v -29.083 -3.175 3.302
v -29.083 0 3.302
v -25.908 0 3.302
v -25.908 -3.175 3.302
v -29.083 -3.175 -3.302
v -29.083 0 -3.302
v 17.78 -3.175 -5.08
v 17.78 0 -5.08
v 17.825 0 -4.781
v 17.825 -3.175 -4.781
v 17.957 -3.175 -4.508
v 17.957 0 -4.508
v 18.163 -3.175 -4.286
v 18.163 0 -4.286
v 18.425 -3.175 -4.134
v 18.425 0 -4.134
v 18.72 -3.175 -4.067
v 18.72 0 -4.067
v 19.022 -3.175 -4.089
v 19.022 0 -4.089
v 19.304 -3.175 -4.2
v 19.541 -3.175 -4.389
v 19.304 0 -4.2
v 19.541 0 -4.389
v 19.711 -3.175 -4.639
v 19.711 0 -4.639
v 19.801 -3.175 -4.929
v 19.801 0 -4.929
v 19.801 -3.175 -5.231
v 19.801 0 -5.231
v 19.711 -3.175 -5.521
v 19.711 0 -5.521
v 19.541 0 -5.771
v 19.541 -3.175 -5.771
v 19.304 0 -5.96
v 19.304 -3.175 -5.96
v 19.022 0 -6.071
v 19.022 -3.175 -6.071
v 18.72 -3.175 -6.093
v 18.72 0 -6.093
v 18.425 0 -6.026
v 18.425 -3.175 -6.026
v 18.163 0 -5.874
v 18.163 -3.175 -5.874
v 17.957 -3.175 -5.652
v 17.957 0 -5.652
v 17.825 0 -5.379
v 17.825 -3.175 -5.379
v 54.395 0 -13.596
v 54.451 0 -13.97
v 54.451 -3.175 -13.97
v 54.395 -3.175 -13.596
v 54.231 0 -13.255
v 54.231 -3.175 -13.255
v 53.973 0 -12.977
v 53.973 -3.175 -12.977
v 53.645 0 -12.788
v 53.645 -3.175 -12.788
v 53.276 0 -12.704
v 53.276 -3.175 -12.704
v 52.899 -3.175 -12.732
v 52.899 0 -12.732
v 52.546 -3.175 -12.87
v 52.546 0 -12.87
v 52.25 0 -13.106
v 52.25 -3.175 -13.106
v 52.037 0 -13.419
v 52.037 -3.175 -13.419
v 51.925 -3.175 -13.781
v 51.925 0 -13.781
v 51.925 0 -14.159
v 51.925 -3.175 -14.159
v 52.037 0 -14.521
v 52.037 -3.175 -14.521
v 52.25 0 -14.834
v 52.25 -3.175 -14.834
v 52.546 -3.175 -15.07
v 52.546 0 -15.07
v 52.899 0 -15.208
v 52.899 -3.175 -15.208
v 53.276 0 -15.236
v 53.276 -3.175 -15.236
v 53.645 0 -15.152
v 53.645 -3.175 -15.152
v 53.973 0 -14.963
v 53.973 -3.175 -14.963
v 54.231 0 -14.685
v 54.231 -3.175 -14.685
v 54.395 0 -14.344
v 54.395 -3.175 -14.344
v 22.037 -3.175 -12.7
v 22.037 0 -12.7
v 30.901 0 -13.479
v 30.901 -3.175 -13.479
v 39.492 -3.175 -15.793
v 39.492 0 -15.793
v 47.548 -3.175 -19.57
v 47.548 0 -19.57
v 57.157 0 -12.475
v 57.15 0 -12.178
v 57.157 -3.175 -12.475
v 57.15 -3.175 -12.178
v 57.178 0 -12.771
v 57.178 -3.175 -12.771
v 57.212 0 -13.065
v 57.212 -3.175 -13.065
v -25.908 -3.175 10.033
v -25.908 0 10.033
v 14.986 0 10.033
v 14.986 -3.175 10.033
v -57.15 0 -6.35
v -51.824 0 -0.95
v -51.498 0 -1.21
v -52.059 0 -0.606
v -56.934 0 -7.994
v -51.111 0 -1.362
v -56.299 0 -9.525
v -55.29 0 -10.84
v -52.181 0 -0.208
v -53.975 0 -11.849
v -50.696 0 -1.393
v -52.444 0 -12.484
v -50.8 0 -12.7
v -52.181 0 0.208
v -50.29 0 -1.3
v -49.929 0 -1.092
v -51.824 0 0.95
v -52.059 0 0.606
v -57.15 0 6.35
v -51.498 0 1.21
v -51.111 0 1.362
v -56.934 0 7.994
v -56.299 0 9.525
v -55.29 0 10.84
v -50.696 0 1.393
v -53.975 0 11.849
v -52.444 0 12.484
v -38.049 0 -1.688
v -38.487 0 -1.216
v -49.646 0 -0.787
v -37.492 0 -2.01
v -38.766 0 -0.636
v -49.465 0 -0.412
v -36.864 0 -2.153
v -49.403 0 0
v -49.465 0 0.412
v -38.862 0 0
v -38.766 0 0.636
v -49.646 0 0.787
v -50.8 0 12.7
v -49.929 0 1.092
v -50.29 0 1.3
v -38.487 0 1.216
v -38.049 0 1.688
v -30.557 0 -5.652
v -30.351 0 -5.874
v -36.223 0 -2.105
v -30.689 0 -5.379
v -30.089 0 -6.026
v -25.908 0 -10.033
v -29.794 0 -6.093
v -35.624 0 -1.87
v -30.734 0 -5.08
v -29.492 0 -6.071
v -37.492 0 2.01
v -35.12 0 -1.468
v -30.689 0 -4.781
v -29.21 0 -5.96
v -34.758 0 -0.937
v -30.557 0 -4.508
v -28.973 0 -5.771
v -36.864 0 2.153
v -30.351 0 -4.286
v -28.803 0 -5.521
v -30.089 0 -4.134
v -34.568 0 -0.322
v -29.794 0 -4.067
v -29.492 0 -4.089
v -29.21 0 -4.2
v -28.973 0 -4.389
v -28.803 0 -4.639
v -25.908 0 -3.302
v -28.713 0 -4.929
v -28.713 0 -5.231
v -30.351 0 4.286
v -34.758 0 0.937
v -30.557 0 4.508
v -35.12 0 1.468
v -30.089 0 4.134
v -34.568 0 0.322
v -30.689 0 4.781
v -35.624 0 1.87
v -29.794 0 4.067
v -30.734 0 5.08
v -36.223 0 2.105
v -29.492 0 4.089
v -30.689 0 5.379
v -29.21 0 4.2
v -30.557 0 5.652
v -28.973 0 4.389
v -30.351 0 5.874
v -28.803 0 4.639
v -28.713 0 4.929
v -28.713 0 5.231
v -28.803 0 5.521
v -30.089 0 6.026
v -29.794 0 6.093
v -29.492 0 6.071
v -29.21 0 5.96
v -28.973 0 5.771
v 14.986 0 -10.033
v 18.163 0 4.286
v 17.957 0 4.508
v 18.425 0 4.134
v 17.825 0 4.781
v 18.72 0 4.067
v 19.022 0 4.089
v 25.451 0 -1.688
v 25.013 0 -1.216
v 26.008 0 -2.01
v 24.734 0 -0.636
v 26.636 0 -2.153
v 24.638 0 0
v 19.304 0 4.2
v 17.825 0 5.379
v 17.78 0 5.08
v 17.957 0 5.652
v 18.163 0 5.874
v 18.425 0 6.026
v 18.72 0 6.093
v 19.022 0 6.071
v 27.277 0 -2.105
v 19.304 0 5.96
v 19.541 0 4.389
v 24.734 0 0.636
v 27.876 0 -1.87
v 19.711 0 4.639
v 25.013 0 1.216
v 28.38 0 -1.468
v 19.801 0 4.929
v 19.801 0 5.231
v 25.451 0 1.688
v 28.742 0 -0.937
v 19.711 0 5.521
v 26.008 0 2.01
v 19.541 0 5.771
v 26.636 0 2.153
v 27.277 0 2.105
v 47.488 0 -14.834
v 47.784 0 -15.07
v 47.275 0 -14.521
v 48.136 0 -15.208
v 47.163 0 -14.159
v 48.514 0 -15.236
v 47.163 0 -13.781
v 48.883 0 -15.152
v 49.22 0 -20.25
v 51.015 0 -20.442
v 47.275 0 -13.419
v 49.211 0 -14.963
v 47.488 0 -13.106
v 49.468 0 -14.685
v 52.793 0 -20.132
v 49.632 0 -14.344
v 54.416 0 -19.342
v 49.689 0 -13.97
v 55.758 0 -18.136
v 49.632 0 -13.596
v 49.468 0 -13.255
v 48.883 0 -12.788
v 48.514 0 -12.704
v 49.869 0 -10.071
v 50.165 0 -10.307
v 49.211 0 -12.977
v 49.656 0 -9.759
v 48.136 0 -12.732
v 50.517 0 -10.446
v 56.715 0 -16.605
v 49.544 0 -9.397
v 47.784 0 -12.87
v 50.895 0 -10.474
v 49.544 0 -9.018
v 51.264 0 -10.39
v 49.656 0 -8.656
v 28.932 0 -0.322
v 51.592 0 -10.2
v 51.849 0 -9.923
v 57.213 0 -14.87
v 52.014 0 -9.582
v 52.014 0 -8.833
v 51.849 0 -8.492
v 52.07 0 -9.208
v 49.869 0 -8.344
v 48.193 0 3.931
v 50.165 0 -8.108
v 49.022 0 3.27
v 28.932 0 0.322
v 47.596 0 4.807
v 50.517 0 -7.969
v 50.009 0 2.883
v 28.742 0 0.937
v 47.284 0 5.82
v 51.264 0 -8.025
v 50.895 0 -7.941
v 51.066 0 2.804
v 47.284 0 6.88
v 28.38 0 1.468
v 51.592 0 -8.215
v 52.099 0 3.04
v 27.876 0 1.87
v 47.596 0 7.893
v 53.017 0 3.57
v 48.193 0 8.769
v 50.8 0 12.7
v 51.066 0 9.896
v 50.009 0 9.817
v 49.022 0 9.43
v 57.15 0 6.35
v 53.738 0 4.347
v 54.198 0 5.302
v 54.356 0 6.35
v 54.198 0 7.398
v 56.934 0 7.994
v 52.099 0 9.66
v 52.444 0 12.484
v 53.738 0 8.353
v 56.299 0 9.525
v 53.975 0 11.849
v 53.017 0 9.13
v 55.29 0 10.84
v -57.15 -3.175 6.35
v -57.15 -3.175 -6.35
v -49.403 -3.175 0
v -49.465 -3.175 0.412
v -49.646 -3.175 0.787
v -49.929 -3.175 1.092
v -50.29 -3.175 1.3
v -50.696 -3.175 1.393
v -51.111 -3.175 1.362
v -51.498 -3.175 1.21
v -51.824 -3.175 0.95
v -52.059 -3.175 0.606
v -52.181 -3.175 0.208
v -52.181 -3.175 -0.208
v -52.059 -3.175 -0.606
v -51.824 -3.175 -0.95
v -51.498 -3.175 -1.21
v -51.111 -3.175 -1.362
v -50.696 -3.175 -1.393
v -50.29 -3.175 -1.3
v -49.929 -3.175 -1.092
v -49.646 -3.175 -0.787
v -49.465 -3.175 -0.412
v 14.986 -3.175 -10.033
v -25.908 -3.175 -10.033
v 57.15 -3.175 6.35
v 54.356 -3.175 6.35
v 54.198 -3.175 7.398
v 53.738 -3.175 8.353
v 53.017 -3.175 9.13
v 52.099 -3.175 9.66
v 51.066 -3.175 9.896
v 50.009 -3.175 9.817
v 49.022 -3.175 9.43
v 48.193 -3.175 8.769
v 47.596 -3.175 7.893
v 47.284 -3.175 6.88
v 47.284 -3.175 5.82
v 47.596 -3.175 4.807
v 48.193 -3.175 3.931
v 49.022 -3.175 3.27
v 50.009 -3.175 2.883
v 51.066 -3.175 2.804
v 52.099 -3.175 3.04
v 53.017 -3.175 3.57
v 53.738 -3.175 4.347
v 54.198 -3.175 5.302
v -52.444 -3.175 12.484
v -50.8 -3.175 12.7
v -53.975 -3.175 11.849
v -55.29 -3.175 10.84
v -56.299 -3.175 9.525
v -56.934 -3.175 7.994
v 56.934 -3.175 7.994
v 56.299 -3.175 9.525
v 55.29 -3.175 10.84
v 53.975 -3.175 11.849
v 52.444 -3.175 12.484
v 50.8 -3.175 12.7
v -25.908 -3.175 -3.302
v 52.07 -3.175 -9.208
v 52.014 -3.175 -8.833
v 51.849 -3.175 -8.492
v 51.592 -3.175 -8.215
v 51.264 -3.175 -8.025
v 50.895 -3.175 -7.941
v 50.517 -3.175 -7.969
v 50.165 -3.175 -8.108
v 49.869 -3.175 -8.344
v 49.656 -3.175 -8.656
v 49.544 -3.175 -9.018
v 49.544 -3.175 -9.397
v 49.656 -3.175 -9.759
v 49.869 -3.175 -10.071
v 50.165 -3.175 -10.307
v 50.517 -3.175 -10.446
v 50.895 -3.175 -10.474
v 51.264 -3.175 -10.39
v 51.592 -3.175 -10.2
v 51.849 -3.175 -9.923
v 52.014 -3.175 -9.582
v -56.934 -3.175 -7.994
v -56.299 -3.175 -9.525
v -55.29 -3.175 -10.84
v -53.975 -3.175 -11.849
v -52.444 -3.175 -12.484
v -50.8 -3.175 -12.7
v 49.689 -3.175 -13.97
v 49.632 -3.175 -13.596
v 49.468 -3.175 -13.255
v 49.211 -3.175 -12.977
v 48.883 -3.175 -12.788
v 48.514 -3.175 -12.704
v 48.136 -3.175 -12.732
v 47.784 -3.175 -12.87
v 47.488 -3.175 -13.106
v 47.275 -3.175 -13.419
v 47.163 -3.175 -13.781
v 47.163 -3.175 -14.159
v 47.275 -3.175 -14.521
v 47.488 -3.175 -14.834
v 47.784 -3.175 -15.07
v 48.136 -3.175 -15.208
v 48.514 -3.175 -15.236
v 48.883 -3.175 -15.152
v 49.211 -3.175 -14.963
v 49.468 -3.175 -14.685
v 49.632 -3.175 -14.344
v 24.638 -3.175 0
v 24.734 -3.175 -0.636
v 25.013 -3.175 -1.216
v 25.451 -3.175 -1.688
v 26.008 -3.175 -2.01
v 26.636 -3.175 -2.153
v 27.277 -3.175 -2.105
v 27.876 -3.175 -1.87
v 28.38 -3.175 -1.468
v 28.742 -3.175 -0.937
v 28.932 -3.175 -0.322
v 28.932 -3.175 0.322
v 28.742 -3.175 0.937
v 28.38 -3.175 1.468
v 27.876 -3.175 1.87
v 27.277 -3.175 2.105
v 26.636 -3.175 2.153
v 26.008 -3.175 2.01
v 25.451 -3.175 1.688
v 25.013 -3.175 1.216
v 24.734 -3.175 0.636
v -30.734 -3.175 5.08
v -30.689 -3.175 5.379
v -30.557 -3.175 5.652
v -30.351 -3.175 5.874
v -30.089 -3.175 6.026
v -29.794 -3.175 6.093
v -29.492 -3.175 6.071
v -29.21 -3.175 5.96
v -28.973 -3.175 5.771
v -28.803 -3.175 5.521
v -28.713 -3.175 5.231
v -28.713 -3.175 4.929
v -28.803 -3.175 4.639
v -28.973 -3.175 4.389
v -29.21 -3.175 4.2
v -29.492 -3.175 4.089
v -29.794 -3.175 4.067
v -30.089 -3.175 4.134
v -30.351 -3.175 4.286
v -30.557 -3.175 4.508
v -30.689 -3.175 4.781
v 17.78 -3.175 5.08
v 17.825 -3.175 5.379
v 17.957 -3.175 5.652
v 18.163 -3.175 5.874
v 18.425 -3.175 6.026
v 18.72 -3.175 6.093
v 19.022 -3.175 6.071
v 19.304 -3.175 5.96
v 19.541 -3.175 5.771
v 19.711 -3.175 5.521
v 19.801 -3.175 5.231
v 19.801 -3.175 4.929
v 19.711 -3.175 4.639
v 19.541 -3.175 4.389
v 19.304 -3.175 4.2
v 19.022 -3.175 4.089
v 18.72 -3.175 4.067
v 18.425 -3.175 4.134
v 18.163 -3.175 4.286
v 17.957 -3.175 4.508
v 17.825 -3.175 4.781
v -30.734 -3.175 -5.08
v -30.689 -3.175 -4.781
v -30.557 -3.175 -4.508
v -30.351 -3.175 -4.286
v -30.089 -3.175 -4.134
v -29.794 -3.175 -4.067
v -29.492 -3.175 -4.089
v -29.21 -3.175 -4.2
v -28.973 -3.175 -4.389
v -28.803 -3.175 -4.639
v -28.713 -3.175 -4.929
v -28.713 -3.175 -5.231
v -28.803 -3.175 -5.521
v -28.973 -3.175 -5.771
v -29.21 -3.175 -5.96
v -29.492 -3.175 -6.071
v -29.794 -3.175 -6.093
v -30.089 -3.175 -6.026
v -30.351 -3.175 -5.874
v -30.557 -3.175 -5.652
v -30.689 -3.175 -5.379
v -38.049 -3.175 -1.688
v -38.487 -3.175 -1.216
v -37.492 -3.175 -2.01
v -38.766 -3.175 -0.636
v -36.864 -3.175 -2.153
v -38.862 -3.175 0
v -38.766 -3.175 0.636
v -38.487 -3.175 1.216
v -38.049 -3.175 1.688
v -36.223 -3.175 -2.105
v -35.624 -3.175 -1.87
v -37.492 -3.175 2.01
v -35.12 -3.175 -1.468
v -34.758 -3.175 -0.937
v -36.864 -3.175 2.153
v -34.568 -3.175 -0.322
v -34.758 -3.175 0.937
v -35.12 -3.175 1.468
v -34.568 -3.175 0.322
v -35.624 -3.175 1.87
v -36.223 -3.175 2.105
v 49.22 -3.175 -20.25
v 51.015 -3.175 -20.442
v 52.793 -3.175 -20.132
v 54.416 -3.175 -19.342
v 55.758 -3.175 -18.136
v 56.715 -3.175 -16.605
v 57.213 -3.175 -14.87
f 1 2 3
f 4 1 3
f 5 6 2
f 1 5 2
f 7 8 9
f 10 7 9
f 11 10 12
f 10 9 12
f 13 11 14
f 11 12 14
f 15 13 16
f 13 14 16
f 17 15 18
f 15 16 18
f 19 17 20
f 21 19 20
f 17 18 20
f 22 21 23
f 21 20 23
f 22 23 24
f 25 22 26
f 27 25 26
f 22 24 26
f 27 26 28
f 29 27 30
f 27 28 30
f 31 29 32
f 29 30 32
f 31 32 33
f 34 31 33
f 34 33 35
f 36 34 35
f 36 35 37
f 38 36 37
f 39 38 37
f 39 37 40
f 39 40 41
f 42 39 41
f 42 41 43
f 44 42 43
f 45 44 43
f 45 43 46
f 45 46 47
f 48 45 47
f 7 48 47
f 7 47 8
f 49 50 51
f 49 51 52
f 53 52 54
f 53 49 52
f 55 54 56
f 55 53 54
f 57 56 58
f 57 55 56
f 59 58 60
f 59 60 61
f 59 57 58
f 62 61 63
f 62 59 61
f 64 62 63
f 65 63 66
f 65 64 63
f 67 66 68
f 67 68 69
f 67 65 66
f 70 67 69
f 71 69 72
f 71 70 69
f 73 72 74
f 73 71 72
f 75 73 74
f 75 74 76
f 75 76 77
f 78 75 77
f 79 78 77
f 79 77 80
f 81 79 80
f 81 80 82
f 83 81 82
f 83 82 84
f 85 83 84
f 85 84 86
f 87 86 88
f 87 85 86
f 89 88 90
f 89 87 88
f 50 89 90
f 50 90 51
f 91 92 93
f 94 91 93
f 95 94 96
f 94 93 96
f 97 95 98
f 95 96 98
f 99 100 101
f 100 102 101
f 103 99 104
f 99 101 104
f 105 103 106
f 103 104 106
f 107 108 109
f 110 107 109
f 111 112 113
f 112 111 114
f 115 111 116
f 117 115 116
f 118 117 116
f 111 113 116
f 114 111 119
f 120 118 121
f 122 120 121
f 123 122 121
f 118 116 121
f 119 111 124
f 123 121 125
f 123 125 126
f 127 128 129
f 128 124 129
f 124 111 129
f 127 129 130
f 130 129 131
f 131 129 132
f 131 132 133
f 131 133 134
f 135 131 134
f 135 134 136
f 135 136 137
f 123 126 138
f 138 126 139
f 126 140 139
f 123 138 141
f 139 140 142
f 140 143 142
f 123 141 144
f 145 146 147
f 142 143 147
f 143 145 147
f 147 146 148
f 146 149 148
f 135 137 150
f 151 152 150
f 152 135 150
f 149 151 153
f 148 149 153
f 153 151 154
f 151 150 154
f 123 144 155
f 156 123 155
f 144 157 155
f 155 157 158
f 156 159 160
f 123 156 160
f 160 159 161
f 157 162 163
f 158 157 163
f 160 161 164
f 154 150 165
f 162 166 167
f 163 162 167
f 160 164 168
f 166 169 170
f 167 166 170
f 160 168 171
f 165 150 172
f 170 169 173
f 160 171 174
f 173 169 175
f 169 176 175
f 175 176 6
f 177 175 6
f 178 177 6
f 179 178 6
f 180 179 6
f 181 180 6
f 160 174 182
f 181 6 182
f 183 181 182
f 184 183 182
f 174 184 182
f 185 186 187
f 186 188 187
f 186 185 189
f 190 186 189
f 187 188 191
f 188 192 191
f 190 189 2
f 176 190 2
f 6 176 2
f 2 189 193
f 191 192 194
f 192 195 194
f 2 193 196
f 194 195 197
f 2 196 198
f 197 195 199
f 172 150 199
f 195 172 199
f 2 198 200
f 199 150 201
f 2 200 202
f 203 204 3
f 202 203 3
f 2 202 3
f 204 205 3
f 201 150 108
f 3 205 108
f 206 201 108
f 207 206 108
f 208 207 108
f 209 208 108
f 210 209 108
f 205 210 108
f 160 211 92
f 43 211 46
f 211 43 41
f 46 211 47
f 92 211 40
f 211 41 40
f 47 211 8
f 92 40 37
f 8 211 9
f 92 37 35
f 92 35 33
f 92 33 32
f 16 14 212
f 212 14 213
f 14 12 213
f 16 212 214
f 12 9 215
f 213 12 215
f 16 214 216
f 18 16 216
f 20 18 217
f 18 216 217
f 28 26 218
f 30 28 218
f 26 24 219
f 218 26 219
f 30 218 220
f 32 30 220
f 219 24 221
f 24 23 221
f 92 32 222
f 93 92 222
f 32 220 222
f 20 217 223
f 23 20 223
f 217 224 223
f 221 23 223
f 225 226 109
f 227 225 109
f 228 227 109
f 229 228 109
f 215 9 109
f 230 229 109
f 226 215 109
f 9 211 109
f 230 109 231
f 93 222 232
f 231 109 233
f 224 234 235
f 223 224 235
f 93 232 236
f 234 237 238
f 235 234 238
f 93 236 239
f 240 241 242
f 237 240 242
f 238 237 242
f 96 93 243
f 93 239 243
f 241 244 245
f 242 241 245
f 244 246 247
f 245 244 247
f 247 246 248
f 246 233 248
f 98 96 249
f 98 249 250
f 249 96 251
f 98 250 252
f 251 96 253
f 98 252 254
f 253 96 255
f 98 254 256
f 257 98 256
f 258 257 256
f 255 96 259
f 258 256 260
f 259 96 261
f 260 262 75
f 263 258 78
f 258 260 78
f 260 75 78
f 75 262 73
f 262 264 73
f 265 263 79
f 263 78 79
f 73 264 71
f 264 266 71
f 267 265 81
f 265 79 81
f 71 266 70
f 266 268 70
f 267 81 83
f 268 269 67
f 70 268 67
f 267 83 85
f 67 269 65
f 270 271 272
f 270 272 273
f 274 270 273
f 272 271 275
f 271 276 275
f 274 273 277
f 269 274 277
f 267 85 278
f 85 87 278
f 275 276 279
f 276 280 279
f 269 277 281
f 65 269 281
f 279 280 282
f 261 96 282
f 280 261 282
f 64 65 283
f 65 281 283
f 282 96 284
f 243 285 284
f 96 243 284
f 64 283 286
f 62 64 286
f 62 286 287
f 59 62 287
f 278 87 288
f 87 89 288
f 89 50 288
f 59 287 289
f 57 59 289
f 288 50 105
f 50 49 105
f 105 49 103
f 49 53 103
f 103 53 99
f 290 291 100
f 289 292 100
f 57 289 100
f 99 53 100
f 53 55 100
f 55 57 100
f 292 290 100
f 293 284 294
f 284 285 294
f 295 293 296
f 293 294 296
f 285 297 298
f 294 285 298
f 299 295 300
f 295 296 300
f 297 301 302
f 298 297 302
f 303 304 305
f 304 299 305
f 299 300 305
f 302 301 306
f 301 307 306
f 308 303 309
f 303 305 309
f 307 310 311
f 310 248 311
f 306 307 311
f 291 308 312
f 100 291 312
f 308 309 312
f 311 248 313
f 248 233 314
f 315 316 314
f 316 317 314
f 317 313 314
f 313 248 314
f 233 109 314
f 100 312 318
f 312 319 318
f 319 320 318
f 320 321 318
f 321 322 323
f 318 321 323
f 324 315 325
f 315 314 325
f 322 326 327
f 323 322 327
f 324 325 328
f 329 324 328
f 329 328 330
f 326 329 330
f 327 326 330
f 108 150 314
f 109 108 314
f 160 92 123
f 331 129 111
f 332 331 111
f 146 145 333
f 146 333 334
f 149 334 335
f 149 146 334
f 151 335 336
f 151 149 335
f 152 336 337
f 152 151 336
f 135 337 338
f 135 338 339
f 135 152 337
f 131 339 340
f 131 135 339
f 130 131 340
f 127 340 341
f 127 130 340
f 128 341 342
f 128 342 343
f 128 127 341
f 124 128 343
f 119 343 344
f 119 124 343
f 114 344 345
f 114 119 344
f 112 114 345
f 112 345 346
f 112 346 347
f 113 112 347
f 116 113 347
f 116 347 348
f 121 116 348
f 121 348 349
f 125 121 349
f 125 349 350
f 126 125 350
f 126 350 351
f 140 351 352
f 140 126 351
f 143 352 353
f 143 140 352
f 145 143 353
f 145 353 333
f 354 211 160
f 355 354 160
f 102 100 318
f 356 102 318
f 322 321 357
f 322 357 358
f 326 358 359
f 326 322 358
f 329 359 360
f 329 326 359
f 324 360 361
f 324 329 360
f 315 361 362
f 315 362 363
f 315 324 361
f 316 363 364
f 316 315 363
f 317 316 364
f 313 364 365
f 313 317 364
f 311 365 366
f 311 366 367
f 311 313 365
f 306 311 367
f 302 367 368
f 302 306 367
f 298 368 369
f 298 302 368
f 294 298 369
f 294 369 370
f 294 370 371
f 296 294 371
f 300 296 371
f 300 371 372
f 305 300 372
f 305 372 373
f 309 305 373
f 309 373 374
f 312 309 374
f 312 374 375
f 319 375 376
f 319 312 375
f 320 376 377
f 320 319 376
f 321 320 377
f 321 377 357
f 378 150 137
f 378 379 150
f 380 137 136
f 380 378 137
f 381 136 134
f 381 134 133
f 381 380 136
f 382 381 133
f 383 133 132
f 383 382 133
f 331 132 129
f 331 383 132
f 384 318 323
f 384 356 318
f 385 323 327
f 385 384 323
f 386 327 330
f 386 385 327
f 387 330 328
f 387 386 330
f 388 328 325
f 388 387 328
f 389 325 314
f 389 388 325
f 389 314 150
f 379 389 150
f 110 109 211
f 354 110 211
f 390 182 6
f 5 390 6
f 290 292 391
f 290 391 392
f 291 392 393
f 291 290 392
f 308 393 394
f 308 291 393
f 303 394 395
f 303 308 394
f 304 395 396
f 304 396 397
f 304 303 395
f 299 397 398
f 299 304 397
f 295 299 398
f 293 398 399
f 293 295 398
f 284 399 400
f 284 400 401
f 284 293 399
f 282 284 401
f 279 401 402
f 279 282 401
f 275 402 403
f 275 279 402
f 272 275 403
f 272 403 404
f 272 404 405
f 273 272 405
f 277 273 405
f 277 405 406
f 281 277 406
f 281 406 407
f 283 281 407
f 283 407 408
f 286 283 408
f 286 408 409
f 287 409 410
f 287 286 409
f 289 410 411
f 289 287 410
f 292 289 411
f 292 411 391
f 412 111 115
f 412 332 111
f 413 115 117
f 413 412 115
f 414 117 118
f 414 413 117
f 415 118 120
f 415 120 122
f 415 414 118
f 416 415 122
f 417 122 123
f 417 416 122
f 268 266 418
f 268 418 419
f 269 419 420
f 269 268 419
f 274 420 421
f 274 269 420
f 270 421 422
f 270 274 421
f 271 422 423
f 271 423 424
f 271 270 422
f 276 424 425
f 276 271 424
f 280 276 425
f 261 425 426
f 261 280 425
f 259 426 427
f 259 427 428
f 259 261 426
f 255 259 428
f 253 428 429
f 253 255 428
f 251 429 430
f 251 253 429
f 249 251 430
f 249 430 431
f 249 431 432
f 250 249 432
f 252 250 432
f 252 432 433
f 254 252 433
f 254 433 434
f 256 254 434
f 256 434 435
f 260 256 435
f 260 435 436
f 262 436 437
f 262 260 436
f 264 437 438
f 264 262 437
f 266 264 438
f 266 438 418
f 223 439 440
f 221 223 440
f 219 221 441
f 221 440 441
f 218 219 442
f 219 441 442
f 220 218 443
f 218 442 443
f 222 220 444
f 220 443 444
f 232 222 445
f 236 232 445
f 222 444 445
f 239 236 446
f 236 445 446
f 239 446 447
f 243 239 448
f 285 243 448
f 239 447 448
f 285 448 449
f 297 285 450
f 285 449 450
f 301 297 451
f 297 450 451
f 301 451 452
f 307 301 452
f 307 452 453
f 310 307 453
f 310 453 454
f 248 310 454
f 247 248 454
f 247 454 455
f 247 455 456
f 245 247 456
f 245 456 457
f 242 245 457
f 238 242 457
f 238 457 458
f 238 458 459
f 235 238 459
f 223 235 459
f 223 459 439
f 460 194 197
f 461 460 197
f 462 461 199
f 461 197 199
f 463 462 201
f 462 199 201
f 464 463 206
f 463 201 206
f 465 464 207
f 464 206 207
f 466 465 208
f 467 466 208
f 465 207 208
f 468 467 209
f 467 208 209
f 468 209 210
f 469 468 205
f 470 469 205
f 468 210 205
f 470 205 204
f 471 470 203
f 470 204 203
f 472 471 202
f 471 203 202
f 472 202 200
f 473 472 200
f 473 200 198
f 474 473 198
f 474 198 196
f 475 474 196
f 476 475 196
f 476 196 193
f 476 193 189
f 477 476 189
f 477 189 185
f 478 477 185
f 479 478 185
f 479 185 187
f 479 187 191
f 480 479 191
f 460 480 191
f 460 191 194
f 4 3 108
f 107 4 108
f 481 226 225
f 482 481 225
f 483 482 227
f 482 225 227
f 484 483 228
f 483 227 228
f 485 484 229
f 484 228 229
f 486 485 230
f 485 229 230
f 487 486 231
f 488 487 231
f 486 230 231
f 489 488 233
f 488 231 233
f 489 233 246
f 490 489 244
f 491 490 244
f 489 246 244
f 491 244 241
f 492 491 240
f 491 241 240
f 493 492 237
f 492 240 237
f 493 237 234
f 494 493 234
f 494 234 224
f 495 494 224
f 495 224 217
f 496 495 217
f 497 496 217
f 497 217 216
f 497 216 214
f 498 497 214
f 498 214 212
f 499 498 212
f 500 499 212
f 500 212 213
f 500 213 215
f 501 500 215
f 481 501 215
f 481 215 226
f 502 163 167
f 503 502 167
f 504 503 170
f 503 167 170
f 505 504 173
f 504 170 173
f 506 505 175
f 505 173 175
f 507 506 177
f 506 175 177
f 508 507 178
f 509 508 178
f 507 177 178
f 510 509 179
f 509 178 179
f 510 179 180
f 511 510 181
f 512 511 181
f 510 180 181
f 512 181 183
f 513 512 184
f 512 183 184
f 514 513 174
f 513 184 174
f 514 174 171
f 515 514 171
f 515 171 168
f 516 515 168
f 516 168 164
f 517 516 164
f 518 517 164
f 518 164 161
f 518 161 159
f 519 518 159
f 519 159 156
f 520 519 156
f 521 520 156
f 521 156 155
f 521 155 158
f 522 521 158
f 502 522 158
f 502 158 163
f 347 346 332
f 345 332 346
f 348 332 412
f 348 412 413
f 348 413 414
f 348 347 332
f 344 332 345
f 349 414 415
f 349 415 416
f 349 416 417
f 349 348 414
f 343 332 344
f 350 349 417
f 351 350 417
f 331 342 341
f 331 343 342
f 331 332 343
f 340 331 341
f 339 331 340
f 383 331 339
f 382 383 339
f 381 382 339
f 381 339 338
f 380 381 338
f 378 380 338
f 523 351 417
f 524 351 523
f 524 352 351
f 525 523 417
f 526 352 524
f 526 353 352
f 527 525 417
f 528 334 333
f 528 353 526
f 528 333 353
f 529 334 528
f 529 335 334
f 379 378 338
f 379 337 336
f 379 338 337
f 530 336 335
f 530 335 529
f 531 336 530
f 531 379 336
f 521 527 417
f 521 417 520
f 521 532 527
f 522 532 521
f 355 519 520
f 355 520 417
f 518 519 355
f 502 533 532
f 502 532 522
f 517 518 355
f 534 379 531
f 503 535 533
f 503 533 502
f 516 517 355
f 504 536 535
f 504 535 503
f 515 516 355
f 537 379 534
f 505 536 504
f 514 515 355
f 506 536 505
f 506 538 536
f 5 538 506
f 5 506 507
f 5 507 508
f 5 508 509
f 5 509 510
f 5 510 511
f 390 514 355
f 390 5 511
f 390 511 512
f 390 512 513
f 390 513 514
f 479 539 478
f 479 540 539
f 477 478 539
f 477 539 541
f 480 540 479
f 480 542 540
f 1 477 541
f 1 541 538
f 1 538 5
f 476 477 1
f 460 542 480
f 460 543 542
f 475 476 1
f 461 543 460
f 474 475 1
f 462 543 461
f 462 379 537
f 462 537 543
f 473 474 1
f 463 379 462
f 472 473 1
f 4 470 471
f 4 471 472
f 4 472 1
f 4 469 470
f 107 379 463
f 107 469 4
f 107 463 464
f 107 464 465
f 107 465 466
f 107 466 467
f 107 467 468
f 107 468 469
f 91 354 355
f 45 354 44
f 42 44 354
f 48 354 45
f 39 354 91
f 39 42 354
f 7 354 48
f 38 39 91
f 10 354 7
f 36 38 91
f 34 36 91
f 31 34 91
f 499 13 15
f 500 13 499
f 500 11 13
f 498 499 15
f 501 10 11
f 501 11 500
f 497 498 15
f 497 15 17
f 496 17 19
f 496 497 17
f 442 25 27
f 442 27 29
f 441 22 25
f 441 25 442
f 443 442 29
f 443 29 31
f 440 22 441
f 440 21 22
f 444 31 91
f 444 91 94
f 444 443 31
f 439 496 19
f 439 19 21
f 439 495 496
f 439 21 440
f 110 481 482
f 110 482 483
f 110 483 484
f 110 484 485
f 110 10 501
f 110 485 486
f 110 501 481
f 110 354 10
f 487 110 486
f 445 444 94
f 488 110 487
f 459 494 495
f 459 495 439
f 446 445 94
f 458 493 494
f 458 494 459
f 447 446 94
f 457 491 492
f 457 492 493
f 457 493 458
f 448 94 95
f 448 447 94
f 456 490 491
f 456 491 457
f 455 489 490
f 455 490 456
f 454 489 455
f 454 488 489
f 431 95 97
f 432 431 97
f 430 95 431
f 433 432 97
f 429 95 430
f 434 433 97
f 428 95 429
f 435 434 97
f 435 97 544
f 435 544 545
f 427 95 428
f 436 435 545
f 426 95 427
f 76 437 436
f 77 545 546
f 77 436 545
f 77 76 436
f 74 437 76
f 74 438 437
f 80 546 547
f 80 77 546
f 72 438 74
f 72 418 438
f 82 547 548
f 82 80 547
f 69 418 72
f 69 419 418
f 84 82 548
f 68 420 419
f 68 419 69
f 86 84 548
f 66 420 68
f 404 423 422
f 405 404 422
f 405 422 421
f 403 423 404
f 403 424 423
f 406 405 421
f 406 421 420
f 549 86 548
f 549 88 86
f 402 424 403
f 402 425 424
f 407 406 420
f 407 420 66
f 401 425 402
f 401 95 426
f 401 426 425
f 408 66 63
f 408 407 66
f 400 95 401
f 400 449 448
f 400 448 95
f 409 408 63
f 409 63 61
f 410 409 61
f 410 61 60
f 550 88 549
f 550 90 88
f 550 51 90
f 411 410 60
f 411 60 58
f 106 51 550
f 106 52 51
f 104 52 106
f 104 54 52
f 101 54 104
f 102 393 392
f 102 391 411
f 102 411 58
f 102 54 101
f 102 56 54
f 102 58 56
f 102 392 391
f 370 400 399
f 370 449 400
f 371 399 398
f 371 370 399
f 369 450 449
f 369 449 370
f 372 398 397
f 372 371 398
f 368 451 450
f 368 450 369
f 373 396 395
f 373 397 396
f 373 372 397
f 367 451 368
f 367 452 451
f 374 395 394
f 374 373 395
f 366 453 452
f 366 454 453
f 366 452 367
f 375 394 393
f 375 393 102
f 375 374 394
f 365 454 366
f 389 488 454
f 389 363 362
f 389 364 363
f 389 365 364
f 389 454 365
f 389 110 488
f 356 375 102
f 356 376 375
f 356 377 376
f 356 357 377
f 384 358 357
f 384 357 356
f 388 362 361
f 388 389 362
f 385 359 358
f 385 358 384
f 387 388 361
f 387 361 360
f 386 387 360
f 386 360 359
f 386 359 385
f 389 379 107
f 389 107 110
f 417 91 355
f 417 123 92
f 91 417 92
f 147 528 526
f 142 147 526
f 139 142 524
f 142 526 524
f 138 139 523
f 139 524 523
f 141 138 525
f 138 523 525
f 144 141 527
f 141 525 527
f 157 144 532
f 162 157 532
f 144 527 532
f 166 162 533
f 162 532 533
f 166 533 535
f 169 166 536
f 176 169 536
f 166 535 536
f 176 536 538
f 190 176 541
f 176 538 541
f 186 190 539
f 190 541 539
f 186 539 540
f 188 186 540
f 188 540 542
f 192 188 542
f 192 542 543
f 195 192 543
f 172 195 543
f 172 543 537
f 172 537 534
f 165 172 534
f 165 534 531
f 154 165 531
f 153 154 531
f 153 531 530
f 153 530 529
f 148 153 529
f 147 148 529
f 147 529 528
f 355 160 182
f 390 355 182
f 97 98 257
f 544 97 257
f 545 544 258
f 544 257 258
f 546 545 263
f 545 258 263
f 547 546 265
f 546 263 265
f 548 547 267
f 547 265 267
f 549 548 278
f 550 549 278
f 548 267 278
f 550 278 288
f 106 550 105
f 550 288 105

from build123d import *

# Parameters (mm, degrees)
F0_R     = 1.27
F0_R_2   = 1.397
F0_R_3   = 3.556
F1_DEPTH = 3.175
F3_D     = 2.032
F5_D     = 4.318
F6_R     = 6.35


with BuildPart() as f1:
    # F0 (on Front) → F1 (new body)
    with BuildSketch(Plane.XZ):
        with BuildLine():
            Line((57.15, -12.7), (57.15, 12.7))
            Line((57.15, 12.7), (-57.15, 12.7))
            Line((-57.15, 12.7), (-57.15, -12.7))
            Line((-57.15, -12.7), (22.03733, -12.7))
            ThreePointArc((22.03733, -12.7), (35.247098, -14.447558), (47.548013, -19.569998))
            ThreePointArc((47.548013, -19.569998), (54.568108, -19.23657), (57.15, -12.7))
        make_face()
        with Locations((48.41875, -13.97)):
            Circle(F0_R, mode=Mode.SUBTRACT)
        with Locations((53.18125, -13.97)):
            Circle(F0_R, mode=Mode.SUBTRACT)
        with Locations((50.8, -9.2075)):
            Circle(F0_R, mode=Mode.SUBTRACT)
        with Locations((-50.8, 0)):
            Circle(F0_R_2, mode=Mode.SUBTRACT)
        Polygon((-25.908, 10.033), (14.986, 10.033), (14.986, -10.033), (-25.908, -10.033), (-25.908, -3.302), (-29.083, -3.302), (-29.083, 3.302), (-25.908, 3.302), align=None, mode=Mode.SUBTRACT)
        with Locations((50.8, 6.35)):
            Circle(F0_R_3, mode=Mode.SUBTRACT)
    extrude(amount=F1_DEPTH)

    # F3 (through all)
    with Locations(Plane.XZ.offset(3.175)):
        with Locations((-29.718, 5.08), (18.796, 5.08), (18.796, -5.08), (-29.718, -5.08)):
            Hole(F3_D / 2)

    # F5 (through all)
    with Locations(Plane(origin=(0, 0, 0), x_dir=(1, 0, 0), z_dir=(0, 1, 0))):
        with Locations((-36.703, 0), (26.797, 0)):
            Hole(F5_D / 2)

    # F6
    f6_edges = [f1.edges().sort_by_distance(p)[0] for p in [
        (-57.15, -1.5875, 12.7),
        (-57.15, -1.5875, -12.7),
        (57.15, -1.5875, 12.7),
        (57.15, -1.5875, -12.7),
    ]]
    fillet(f6_edges, radius=F6_R)


solid = f1.part
